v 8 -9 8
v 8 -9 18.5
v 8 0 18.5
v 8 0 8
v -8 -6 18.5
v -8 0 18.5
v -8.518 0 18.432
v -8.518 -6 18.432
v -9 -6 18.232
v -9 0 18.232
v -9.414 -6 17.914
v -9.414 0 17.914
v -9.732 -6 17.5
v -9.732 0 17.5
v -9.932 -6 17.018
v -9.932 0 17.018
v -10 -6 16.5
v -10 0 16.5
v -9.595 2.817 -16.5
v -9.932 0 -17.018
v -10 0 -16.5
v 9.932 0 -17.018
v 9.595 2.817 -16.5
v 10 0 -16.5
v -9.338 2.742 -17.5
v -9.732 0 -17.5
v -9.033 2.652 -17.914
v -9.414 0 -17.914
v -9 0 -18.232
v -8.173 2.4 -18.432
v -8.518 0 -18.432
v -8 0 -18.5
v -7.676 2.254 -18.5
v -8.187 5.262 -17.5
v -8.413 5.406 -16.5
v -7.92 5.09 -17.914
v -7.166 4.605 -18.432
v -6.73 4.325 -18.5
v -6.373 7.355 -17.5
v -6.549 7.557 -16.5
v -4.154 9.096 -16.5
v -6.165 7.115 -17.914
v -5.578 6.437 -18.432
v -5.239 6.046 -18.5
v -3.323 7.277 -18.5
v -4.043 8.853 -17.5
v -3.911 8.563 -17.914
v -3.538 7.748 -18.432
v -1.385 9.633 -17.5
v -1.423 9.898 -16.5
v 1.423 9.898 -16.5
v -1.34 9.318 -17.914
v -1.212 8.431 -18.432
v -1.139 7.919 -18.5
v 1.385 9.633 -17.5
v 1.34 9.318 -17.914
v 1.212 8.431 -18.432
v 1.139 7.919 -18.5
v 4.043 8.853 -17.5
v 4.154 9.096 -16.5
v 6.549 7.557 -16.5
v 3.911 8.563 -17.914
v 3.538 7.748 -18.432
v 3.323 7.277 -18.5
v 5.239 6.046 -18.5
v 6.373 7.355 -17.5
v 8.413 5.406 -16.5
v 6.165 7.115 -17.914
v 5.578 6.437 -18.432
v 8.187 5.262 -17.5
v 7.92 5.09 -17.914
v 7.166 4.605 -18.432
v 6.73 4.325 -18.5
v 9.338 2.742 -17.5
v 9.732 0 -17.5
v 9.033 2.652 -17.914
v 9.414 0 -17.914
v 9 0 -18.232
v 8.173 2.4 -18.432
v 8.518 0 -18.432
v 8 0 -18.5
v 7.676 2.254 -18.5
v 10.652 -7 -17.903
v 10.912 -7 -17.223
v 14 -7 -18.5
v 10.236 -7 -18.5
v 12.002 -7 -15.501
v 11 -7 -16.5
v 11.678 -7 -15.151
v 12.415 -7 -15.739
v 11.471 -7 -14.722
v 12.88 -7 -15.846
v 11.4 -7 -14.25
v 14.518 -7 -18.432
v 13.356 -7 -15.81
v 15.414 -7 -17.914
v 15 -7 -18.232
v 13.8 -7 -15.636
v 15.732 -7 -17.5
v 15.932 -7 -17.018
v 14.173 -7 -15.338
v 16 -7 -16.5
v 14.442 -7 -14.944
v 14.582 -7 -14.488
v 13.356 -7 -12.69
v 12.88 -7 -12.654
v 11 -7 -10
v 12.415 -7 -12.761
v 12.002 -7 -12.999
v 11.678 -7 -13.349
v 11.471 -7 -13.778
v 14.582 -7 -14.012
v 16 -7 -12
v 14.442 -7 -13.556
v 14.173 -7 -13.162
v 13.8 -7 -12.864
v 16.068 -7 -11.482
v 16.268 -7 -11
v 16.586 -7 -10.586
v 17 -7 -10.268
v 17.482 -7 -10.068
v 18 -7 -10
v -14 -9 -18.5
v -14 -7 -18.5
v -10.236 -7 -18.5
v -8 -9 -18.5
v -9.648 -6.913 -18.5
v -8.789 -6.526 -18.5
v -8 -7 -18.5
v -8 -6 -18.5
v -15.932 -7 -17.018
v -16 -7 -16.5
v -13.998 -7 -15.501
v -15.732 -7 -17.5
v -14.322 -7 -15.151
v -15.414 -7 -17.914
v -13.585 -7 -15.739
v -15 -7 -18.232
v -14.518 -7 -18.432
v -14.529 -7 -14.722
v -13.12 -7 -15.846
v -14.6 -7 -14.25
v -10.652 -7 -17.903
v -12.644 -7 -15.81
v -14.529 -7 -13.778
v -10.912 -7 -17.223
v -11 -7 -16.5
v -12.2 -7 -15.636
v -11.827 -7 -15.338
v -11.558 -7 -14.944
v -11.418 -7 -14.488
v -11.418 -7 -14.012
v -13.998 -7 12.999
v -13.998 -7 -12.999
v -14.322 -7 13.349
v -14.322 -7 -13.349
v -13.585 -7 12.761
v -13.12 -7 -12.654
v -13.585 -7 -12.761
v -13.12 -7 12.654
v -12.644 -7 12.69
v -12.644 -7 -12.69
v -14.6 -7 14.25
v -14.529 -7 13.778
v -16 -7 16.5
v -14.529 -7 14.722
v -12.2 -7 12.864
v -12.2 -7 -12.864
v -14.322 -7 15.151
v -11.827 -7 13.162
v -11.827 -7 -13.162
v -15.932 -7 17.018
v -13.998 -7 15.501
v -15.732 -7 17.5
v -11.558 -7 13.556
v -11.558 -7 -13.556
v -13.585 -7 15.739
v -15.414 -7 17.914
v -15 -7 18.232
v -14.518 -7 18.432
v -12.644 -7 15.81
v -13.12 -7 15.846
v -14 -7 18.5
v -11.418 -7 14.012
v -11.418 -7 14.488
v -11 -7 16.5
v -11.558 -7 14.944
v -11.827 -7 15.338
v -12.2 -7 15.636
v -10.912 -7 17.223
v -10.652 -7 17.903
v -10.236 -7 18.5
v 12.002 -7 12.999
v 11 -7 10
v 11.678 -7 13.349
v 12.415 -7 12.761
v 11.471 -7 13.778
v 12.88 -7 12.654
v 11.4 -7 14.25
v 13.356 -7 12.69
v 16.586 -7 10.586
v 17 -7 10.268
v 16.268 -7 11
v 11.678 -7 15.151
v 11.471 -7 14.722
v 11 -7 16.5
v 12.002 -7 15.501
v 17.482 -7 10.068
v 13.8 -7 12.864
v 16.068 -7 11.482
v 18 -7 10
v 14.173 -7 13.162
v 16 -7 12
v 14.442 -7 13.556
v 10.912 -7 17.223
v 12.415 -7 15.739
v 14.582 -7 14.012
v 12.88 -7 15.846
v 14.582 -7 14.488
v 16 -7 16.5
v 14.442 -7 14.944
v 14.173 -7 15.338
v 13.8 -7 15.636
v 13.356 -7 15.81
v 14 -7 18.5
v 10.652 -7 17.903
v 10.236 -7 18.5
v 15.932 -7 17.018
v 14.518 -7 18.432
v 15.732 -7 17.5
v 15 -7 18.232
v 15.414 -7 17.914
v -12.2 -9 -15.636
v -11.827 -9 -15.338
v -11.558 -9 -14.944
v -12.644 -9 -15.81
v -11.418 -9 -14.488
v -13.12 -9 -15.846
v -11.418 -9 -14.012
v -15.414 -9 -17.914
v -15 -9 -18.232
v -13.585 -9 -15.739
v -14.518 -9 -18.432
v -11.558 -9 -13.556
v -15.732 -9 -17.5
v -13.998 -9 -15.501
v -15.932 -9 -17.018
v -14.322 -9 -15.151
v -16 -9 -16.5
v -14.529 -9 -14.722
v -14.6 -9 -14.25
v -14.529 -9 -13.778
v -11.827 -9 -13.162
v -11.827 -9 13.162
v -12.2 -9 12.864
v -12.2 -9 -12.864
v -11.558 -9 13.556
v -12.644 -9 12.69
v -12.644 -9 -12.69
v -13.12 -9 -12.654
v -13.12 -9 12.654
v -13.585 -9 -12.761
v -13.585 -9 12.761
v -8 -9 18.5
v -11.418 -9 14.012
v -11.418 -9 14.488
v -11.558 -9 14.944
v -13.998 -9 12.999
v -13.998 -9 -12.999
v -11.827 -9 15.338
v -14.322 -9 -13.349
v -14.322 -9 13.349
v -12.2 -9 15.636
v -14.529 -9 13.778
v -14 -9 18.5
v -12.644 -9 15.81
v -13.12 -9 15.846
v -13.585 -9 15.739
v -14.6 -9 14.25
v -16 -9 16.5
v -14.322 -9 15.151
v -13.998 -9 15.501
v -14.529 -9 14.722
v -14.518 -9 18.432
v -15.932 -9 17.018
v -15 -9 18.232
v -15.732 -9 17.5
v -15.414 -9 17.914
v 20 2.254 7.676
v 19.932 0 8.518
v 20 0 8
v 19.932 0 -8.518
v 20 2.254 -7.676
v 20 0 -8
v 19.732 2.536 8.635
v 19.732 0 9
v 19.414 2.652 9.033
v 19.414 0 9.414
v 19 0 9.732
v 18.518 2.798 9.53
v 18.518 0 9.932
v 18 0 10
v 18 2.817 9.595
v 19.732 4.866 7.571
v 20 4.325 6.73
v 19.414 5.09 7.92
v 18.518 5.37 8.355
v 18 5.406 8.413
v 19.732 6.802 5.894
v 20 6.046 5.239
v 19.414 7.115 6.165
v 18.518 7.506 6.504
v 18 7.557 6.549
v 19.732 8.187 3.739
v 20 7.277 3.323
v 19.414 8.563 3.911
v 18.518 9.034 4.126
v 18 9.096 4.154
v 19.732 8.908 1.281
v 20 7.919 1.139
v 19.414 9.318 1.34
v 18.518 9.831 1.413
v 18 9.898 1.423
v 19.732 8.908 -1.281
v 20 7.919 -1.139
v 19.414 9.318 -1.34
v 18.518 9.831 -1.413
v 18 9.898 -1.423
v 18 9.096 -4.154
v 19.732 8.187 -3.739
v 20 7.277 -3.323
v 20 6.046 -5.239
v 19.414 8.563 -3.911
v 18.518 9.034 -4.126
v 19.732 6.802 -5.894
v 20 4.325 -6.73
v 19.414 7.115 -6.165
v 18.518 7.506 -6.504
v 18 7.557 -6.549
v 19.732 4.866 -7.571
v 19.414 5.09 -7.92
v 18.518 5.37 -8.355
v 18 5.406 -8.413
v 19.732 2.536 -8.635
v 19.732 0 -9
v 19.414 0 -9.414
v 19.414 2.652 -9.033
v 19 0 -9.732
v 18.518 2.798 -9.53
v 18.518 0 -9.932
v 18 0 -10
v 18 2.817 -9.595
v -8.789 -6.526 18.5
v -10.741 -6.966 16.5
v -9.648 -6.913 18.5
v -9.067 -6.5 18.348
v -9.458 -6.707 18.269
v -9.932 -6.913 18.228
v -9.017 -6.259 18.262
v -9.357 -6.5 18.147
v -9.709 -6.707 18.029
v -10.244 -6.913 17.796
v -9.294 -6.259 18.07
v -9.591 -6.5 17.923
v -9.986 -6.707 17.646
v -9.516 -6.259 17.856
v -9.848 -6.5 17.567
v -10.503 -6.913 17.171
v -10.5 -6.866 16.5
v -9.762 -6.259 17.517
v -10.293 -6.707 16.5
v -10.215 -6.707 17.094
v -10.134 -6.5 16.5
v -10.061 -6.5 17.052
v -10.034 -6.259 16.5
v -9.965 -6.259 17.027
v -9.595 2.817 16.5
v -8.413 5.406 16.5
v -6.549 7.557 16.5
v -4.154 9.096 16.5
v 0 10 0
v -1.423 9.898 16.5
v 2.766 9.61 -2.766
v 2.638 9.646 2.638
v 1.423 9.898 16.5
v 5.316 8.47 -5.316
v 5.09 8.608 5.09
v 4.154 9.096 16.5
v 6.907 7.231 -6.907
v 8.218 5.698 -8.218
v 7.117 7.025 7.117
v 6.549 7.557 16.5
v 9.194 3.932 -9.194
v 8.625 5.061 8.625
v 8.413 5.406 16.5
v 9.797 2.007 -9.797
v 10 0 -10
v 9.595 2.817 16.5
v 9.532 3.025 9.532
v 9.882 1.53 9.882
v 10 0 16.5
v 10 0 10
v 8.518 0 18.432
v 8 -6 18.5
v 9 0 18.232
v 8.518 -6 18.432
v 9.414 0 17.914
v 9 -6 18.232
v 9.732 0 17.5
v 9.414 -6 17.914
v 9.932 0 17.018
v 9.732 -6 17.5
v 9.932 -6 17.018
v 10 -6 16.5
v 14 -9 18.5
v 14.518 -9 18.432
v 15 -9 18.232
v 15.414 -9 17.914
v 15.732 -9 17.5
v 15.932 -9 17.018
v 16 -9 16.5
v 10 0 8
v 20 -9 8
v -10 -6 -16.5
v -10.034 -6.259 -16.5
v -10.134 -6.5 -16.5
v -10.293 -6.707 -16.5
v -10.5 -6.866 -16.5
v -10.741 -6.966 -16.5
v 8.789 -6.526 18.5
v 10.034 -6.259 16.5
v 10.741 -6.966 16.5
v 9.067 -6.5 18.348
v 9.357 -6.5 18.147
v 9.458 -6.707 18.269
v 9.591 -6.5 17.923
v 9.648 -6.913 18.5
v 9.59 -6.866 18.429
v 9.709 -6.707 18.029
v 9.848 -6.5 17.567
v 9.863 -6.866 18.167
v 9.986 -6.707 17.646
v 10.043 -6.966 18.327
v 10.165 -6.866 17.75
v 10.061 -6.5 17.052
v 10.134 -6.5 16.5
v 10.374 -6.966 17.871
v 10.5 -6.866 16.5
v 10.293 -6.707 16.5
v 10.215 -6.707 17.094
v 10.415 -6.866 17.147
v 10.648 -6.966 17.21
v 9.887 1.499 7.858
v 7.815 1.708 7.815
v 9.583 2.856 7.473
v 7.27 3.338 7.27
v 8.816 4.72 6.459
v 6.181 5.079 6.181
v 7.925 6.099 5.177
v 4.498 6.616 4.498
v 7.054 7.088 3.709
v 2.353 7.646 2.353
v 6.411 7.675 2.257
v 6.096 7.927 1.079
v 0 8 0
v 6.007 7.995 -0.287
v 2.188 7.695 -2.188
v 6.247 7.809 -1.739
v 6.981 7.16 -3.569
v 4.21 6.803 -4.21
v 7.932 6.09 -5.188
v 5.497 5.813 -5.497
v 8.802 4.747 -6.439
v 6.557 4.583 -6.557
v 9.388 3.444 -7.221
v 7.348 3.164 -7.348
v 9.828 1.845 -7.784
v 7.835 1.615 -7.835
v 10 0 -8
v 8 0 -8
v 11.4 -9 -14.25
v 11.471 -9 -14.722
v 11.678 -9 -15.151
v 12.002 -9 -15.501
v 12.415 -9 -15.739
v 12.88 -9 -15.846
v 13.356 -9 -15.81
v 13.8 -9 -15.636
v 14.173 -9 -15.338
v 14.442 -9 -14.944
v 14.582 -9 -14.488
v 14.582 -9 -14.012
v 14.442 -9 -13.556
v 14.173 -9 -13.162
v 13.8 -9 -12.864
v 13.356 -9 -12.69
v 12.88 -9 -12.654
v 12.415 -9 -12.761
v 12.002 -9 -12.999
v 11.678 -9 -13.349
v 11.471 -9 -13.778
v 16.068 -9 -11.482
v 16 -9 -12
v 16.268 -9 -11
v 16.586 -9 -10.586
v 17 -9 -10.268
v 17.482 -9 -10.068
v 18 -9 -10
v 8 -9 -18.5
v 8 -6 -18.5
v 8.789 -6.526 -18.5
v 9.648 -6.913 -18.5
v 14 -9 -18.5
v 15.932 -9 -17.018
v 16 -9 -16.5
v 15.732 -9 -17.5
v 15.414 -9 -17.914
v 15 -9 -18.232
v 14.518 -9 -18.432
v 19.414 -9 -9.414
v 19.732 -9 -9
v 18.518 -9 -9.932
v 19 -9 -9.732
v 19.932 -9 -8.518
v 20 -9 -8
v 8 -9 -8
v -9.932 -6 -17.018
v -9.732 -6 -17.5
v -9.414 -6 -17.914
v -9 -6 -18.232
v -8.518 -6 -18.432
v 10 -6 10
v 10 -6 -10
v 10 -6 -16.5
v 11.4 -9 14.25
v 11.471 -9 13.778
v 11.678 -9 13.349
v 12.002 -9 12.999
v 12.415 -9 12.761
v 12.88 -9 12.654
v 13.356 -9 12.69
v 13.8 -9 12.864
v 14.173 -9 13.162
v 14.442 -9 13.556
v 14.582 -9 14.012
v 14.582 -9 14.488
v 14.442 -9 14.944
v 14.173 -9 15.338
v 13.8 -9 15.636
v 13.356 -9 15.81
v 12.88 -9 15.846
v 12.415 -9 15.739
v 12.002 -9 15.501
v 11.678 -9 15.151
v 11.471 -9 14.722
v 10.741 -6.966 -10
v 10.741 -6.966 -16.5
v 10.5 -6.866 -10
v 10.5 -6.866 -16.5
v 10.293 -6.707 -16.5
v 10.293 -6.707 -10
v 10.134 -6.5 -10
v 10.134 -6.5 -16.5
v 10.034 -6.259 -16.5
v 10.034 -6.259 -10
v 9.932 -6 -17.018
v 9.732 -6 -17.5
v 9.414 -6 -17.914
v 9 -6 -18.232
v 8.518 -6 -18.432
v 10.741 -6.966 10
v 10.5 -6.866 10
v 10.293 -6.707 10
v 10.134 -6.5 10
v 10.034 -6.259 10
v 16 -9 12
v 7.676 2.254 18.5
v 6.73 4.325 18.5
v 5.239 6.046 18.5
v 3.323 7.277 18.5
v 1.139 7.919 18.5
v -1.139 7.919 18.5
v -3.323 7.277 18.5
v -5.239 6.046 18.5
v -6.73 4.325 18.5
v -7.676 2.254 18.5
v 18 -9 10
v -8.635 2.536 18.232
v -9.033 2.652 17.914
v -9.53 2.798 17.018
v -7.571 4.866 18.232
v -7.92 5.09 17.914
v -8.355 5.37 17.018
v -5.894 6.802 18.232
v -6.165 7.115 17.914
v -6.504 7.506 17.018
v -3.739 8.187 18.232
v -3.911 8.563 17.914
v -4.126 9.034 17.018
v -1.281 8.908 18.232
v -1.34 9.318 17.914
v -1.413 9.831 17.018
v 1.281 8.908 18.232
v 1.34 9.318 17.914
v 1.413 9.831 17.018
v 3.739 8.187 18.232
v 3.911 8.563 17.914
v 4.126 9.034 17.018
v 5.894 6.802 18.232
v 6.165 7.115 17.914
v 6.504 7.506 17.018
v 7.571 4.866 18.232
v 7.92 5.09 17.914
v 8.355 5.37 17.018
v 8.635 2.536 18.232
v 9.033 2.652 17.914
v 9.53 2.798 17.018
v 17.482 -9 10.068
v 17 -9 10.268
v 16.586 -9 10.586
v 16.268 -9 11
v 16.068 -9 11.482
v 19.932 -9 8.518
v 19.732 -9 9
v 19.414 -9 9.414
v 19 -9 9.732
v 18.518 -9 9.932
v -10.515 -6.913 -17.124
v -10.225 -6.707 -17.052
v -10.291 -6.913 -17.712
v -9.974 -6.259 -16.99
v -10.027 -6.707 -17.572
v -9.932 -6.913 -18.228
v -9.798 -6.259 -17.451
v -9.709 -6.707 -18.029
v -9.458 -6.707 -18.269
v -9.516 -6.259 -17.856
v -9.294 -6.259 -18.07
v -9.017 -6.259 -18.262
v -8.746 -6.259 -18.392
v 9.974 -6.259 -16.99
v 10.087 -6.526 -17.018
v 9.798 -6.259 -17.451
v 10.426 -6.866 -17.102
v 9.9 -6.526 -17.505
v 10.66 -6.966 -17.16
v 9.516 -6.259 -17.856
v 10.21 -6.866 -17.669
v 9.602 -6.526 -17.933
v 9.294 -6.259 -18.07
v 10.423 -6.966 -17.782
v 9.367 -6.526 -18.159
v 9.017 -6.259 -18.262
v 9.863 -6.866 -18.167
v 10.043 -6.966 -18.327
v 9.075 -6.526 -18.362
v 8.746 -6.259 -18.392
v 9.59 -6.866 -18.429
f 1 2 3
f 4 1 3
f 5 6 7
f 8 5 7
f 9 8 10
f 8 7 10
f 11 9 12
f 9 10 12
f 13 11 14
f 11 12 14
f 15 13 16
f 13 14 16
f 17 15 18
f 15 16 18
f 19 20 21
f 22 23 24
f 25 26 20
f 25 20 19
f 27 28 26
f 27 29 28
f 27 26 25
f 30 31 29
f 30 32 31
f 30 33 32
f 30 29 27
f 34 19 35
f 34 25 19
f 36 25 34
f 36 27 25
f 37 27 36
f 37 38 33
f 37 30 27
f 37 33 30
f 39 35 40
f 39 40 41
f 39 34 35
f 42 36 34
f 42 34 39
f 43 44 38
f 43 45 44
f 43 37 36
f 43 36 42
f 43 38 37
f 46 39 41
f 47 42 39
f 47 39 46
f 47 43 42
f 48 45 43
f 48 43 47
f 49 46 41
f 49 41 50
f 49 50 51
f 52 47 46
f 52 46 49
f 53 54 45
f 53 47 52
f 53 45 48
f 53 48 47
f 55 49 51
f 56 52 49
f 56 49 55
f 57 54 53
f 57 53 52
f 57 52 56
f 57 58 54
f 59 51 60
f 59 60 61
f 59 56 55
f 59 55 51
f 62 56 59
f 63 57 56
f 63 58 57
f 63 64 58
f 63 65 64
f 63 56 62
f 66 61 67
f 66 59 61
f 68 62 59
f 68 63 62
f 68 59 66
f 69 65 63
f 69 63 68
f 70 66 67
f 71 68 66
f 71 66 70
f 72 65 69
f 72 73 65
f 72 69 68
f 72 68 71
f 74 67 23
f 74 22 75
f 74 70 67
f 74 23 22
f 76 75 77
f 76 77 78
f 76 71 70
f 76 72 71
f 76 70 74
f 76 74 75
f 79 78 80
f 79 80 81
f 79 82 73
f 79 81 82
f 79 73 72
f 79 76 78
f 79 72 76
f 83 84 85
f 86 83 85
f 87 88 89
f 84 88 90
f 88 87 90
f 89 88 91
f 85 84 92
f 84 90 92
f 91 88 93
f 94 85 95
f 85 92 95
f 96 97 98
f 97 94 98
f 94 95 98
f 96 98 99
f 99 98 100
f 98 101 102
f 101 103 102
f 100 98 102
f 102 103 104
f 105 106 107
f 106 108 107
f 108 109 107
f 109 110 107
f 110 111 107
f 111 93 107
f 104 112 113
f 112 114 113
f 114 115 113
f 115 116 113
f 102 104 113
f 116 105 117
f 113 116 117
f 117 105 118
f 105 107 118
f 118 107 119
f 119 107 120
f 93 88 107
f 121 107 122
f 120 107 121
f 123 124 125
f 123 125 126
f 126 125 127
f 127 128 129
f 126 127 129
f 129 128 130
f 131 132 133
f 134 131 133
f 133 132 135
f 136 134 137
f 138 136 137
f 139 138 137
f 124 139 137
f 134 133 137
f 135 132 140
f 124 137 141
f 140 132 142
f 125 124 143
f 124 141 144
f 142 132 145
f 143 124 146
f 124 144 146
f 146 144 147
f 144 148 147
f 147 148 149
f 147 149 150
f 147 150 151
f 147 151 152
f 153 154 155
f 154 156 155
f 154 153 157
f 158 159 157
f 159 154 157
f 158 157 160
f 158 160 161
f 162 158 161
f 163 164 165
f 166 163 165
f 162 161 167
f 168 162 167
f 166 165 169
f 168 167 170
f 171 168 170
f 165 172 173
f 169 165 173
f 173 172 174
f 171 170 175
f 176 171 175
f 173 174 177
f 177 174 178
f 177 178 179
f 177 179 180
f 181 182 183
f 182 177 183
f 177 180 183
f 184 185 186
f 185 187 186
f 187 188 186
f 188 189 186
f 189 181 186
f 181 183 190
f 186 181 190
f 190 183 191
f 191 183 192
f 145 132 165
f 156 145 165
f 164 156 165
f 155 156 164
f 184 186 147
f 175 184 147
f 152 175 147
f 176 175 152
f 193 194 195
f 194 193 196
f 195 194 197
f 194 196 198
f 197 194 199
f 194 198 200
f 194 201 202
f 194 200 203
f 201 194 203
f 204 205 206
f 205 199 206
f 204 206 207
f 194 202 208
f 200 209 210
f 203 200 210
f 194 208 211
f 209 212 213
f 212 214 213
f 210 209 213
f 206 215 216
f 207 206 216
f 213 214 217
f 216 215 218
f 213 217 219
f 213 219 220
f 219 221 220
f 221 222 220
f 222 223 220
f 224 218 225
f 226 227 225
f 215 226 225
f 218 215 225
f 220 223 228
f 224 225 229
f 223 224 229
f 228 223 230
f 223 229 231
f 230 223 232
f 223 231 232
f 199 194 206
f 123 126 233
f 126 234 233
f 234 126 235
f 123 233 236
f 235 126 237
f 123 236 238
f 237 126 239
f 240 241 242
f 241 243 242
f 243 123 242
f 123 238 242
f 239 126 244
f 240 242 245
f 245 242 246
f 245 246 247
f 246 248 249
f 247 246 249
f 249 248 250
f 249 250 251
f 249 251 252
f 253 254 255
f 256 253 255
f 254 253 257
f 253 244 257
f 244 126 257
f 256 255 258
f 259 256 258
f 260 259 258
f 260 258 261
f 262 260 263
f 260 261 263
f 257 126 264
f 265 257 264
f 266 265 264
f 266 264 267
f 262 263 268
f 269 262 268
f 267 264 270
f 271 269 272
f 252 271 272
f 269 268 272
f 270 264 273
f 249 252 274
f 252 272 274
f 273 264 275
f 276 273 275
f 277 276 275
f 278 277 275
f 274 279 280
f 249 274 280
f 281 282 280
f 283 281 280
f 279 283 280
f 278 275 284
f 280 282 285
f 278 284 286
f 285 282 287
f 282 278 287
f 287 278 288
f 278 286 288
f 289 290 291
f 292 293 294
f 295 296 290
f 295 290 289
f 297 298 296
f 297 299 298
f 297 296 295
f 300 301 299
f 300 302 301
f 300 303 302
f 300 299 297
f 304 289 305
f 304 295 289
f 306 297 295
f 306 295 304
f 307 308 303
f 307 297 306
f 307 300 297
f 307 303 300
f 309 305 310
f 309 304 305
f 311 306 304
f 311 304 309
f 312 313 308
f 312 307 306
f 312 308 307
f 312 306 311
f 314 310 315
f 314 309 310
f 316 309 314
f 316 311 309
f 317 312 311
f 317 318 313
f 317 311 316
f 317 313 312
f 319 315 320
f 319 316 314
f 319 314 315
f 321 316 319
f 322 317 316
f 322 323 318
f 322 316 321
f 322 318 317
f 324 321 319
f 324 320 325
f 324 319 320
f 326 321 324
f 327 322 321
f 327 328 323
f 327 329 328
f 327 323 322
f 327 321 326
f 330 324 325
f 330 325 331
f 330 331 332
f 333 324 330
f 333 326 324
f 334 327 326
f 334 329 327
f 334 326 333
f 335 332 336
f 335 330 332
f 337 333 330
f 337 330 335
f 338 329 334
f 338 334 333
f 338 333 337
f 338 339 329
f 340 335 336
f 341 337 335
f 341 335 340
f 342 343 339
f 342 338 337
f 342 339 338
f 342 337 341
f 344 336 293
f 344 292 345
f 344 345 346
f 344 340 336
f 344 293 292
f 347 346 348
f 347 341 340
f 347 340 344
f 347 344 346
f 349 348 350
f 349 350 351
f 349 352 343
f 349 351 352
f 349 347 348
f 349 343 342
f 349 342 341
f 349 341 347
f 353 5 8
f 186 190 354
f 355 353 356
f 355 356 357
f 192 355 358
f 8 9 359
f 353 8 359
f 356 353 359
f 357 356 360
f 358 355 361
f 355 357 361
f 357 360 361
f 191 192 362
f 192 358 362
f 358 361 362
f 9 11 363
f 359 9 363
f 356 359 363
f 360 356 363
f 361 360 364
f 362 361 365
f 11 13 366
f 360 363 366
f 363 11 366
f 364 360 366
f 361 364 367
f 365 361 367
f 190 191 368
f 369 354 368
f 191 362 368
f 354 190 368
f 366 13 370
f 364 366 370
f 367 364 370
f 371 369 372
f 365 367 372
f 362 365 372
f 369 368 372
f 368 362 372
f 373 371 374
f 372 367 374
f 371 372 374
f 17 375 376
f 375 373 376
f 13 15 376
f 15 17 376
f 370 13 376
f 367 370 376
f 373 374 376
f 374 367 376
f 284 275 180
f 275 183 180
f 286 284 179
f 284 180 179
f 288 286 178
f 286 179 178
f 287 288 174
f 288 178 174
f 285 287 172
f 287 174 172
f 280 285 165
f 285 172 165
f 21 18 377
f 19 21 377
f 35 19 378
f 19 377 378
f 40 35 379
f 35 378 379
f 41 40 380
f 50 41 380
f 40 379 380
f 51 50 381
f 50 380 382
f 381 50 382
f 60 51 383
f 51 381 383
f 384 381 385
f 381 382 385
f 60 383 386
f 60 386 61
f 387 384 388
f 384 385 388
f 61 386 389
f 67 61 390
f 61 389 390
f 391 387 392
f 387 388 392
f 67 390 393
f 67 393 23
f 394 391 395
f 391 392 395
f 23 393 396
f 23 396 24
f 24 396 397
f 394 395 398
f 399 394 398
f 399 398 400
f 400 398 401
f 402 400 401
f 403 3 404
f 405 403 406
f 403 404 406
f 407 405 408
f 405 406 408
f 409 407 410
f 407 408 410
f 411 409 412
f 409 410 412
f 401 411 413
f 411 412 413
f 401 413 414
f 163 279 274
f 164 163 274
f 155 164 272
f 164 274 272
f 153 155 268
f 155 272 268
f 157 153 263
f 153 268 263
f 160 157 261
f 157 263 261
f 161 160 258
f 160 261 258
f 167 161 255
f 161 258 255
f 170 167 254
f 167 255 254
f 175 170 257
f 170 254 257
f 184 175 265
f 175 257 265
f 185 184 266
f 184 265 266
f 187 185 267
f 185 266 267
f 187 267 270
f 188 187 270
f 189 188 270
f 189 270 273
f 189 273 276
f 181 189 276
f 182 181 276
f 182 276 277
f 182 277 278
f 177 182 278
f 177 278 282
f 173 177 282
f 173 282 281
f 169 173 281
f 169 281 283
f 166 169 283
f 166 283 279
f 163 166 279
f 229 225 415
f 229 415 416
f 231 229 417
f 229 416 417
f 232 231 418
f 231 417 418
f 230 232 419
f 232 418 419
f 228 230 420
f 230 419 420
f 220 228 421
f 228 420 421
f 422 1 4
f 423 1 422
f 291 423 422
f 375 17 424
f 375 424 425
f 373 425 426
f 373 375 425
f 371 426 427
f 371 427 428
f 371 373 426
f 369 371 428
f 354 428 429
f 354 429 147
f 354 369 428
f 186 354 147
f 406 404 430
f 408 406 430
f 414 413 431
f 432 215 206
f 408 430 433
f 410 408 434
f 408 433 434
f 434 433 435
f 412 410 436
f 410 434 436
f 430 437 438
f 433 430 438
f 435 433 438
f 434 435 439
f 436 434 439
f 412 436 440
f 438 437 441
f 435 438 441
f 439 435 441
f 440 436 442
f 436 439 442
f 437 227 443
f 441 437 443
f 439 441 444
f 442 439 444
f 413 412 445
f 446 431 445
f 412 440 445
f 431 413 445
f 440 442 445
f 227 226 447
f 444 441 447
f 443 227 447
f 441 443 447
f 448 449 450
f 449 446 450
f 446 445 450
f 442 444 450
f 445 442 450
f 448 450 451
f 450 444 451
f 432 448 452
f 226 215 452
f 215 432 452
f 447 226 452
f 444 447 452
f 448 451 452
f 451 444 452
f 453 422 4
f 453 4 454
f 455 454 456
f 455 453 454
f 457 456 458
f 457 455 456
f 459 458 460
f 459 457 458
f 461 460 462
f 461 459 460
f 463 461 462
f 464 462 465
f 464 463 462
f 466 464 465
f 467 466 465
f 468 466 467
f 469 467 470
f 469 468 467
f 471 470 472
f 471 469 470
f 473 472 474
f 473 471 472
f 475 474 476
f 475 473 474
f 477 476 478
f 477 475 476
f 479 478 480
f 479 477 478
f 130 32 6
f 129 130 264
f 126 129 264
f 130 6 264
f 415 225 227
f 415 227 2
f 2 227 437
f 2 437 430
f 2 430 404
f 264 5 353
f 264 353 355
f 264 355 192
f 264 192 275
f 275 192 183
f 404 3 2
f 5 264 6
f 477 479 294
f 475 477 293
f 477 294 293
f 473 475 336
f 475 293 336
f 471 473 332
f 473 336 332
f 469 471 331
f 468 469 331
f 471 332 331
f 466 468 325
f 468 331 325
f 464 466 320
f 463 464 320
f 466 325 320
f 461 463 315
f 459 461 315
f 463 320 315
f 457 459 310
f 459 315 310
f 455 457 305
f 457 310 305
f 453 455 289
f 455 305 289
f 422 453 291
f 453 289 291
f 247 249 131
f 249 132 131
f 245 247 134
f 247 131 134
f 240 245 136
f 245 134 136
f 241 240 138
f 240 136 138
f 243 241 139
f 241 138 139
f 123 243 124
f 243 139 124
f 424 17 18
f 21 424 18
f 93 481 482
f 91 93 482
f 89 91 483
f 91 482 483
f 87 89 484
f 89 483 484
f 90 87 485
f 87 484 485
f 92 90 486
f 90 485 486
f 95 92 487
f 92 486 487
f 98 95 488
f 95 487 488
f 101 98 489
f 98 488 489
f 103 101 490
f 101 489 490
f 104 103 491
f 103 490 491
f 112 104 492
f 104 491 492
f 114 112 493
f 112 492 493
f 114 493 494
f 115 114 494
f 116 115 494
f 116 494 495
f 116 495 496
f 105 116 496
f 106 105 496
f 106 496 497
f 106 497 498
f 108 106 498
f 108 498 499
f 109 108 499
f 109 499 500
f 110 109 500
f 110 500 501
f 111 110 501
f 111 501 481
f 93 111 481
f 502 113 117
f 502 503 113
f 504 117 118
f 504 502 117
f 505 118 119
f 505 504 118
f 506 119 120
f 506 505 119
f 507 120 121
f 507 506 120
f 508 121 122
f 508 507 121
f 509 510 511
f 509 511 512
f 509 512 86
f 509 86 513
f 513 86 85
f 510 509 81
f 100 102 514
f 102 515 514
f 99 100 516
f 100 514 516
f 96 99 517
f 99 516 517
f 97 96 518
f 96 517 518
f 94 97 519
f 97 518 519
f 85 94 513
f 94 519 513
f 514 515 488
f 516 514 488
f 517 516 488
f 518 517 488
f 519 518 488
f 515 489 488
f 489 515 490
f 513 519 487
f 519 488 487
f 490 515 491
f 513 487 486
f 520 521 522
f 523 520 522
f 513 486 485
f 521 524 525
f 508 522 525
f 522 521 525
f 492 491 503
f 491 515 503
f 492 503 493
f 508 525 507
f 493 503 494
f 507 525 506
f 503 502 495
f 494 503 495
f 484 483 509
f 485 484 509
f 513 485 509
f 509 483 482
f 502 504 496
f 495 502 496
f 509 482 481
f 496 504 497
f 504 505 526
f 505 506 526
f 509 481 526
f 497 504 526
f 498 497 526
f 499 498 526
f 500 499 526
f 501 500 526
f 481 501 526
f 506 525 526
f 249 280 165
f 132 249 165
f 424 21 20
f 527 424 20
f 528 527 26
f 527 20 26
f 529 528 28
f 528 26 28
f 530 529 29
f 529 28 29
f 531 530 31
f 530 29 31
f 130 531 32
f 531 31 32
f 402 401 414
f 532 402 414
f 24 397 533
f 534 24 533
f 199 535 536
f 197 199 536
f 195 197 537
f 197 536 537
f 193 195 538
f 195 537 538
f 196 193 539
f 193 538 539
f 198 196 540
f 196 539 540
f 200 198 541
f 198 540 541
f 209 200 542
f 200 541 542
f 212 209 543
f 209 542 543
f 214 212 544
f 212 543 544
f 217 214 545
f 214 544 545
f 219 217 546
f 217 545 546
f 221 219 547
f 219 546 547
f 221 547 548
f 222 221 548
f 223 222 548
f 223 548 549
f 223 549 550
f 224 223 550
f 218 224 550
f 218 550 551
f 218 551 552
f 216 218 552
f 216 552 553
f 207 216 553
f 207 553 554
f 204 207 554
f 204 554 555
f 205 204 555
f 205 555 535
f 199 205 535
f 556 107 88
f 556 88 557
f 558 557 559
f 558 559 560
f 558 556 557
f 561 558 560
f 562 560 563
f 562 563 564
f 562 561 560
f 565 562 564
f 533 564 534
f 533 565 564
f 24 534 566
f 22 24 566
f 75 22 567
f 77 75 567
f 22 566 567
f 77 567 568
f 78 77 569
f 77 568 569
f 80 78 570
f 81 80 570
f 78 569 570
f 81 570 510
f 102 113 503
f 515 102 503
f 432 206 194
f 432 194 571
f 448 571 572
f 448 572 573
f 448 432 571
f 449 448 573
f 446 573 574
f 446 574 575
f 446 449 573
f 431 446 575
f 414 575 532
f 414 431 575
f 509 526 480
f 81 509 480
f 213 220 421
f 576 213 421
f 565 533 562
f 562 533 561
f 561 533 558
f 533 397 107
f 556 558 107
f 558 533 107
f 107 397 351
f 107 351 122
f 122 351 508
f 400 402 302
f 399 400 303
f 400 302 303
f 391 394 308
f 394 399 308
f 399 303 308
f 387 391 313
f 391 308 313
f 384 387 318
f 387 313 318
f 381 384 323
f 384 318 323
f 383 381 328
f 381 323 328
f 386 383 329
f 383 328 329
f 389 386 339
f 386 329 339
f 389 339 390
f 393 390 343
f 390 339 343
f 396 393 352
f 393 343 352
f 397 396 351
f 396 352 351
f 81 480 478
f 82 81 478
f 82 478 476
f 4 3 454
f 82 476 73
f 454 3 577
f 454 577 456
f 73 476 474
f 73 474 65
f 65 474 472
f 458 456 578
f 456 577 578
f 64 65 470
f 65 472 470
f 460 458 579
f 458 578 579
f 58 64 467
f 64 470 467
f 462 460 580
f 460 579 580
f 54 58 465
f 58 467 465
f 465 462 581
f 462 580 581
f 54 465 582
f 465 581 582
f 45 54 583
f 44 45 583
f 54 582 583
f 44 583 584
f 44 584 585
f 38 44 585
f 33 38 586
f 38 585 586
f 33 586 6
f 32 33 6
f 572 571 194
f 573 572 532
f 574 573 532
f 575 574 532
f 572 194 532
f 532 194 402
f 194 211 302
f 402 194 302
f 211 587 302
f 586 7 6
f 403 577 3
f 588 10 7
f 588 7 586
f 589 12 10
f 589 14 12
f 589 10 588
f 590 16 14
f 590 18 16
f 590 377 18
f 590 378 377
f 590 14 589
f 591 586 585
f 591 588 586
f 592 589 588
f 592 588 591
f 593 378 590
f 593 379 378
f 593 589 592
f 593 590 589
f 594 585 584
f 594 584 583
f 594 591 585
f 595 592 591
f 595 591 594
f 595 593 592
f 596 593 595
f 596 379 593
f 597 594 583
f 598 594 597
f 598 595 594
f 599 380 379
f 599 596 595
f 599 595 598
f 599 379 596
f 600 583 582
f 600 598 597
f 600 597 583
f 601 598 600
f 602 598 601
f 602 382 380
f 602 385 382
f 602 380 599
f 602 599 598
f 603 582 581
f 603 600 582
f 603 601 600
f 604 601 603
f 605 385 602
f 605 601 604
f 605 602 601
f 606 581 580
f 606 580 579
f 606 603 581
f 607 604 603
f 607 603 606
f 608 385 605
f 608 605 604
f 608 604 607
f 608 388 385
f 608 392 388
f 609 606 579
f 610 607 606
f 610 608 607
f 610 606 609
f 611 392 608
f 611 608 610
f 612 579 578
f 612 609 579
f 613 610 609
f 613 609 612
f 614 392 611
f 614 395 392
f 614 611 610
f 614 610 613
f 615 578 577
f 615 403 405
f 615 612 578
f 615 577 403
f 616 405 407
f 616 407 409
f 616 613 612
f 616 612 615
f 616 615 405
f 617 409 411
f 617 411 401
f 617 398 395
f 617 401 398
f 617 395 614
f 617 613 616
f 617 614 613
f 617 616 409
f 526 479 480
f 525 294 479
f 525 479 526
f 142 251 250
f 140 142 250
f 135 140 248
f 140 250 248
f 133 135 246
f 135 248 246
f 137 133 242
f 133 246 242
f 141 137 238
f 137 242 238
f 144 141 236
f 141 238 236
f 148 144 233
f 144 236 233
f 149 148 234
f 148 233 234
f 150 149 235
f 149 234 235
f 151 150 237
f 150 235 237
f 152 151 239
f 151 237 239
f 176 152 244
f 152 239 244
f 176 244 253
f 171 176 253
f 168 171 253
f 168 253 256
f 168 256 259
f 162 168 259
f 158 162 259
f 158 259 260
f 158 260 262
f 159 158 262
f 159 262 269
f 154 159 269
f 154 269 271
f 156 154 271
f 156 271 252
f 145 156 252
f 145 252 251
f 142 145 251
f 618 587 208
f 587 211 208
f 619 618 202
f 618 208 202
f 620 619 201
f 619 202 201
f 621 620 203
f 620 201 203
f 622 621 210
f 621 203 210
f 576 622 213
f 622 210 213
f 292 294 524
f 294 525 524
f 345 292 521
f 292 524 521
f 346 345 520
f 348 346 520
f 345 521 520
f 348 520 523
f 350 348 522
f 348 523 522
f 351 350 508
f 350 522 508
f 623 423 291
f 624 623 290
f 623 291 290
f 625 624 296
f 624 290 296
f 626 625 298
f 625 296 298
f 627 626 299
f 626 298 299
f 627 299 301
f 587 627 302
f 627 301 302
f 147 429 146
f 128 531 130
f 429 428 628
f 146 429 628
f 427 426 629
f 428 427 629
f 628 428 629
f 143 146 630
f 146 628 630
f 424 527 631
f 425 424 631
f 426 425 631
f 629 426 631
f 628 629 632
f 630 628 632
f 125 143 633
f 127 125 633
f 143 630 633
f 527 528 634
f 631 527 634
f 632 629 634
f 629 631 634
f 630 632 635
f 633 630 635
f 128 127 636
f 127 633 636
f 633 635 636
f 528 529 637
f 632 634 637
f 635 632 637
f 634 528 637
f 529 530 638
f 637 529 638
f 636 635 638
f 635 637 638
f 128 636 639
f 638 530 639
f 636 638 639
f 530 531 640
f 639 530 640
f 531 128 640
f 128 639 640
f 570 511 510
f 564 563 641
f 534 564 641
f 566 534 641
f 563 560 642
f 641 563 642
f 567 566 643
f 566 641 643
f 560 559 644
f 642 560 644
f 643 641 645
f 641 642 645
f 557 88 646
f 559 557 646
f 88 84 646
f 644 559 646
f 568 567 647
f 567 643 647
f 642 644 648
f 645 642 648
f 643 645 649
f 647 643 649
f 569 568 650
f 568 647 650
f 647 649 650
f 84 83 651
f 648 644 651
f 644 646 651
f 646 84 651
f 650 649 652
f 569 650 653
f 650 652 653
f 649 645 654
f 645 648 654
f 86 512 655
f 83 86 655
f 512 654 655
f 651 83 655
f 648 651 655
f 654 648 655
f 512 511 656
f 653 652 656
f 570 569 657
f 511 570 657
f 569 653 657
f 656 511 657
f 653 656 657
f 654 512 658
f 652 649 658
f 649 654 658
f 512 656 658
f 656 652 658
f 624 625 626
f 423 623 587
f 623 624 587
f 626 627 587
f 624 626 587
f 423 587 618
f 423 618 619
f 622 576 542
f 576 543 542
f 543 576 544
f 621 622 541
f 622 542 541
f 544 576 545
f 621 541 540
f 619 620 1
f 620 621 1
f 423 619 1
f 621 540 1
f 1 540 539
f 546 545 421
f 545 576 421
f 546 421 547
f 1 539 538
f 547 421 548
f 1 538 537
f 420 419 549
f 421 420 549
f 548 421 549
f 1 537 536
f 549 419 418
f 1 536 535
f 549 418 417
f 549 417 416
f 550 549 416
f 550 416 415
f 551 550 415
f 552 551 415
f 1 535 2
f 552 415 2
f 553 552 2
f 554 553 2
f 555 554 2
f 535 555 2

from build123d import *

# Parameters (mm, degrees)
BOSS_EXTRUDE2_DEPTH  = 18.5
M3_CLEARANCE_HOLE1_D = 3.2
BOSS_EXTRUDE3_REACH  = 43.692
CUT_EXTRUDE1_REACH   = 43.692
FILLET1_R            = 2
FILLET2_R            = 1


# Some blends are built 0.0001 mm under size
with BuildPart() as part:
    # Sketch2 → Boss-Extrude2 (new, symmetric)
    with BuildSketch(Plane.XY):
        with BuildLine():
            Line((-8, 0), (-8, -9))
            Line((-8, -9), (-16, -9))
            Line((-16, -9), (-16, -7))
            Line((-16, -7), (-10, -7))
            Line((-10, -7), (-10, 0))
            ThreePointArc((-10, 0), (0, 10), (10, 0))
            Line((10, 0), (10, -7))
            Line((10, -7), (16, -7))
            Line((16, -7), (16, -9))
            Line((16, -9), (8, -9))
            Line((8, -9), (8, 0))
            ThreePointArc((8, 0), (0, 8), (-8, 0))
        make_face()
    extrude(amount=BOSS_EXTRUDE2_DEPTH, both=True)

    # M3 Clearance Hole1 (through all)
    with Locations(Plane(origin=(0, -7, 0), x_dir=(1, 0, 0), z_dir=(0, 1, 0))):
        with Locations((-13, 14.25), (13, 14.25), (13, -14.25), (-13, -14.25)):
            Hole(M3_CLEARANCE_HOLE1_D / 2)

    # Sketch6 → Boss-Extrude3 (add, up to next)
    with BuildSketch(Plane(origin=(20, 0, 0), x_dir=(0, 0, -1), z_dir=(1, 0, 0)), mode=Mode.PRIVATE) as boss_extrude3_sk1:
        with BuildLine():
            Line((-8, 0), (-8, -9))
            Line((-8, -9), (-10, -9))
            Line((-10, -9), (-10, 0))
            ThreePointArc((-10, 0), (0, 10), (10, 0))
            Line((10, 0), (10, -9))
            Line((10, -9), (8, -9))
            Line((8, -9), (8, 0))
            ThreePointArc((8, 0), (0, 8), (-8, 0))
        make_face()
    boss_extrude3_tool1 = extrude(boss_extrude3_sk1.sketch, amount=-BOSS_EXTRUDE3_REACH, mode=Mode.PRIVATE) - part.part
    add(boss_extrude3_tool1.solids().sort_by_distance((20, -4.5, -9.724138))[0])

    # Sketch7 → Cut-Extrude1 (cut, up to next)
    with BuildSketch(Plane(origin=(20, 0, 0), x_dir=(0, 0, -1), z_dir=(1, 0, 0)), mode=Mode.PRIVATE) as cut_extrude1_sk1:
        with BuildLine():
            Line((8, 0), (8, -7))
            Line((8, -7), (8, -9))
            Line((8, -9), (-8, -9))
            Line((-8, -9), (-8, -7))
            Line((-8, -7), (-8, 0))
            ThreePointArc((-8, 0), (0, 8), (8, 0))
        make_face()
    cut_extrude1_tool1 = extrude(cut_extrude1_sk1.sketch, amount=-CUT_EXTRUDE1_REACH, mode=Mode.PRIVATE) & part.part
    add(cut_extrude1_tool1.solids().sort_by_distance((20, -1.254102, 0))[0], mode=Mode.SUBTRACT)

    # Fillet1
    fillet1_edges = [part.edges().sort_by_distance(p)[0] for p in [
        (16, -8, -10),
        (16, -8, 10),
        (16, -8, 18.5),
        (16, -8, -18.5),
        (-16, -8, 18.5),
        (-16, -8, -18.5),
        (20, -4.5, 10),
        (20, 10, 0),
        (20, -4.5, -10),
        (10, -3.5, -18.5),
        (-10, -3.5, -18.5),
        (10, -3.5, 18.5),
        (-10, -3.5, 18.5),
        (0, 10, -18.5),
        (0, 10, 18.5),
    ]]
    fillet(fillet1_edges, radius=FILLET1_R - 0.0001)  # a hair under: the kernel refuses the full size

    # Fillet2
    # the kernel refuses this fillet: 1 mm, written as the material it adds along each edge
    with BuildSketch(Plane(origin=(-10, -7, 16.5001), x_dir=(0, 1, 0), z_dir=(0, 0, -1))) as fillet2_piece_1:
        with BuildLine():
            CenterArc((FILLET2_R, -FILLET2_R), FILLET2_R, 90, 90)
            Line((0, -FILLET2_R), (0, 0))
            Line((0, 0), (FILLET2_R, 0))
        make_face()
    extrude(amount=33.0002)
    with BuildSketch(Plane(origin=(10, -7, 16.5001), x_dir=(0, 1, 0), z_dir=(0, 0, -1)), Plane(origin=(10, -7, -10), x_dir=(0, 1, 0), z_dir=(0, 0, -1))) as fillet2_piece_2:
        with BuildLine():
            CenterArc((FILLET2_R, FILLET2_R), FILLET2_R, 180, 90)
            Line((0, FILLET2_R), (0, 0))
            Line((0, 0), (FILLET2_R, 0))
        make_face()
    extrude(amount=6.5001)
    with BuildSketch(Plane(origin=(8.0001, -7, -16.5001), x_dir=(1, 0, 0), z_dir=(0, 0, 1))) as fillet2_piece_3_section:
        with BuildLine():
            CenterArc((1.9999 + FILLET2_R, FILLET2_R), FILLET2_R, 180, 90)
            Line((1.9999, FILLET2_R), (1.9999, 0))
            Line((1.9999, 0), (1.9999 + FILLET2_R, 0))
        make_face()
    fillet2_piece_3 = revolve(axis=Axis((8.0001, -7, -16.5001), (0, 1, 0)), revolution_arc=161.652077223, mode=Mode.PRIVATE)
    fillet2_piece_3 = split(fillet2_piece_3, bisect_by=Plane(origin=(10.2121031, -6.837361474, -18.5), z_dir=(0, 0, 1)), keep=Keep.TOP, mode=Mode.PRIVATE)
    fillet2_piece_3 = split(fillet2_piece_3, bisect_by=Plane(origin=(8, -6.837361474, -17.073760291), z_dir=(1, 0, 0)), keep=Keep.TOP, mode=Mode.PRIVATE)
    add(fillet2_piece_3)
    with BuildSketch(Plane(origin=(-8.0001, -7, -16.5001), x_dir=(-1, 0, 0), z_dir=(0, 0, 1))) as fillet2_piece_4_section:
        with BuildLine():
            CenterArc((1.9999 + FILLET2_R, -FILLET2_R), FILLET2_R, 90, 90)
            Line((1.9999 + FILLET2_R, 0), (1.9999, 0))
            Line((1.9999, 0), (1.9999, -FILLET2_R))
        make_face()
    fillet2_piece_4 = revolve(axis=Axis((-8.0001, -7, -16.5001), (0, -1, 0)), revolution_arc=161.652077223, mode=Mode.PRIVATE)
    fillet2_piece_4 = split(fillet2_piece_4, bisect_by=Plane(origin=(-8, -6.727847021, -17.962226861), z_dir=(-1, 0, 0)), keep=Keep.TOP, mode=Mode.PRIVATE)
    fillet2_piece_4 = split(fillet2_piece_4, bisect_by=Plane(origin=(-9.462226887, -6.727847021, -18.5), z_dir=(0, 0, 1)), keep=Keep.TOP, mode=Mode.PRIVATE)
    add(fillet2_piece_4)
    with BuildSketch(Plane(origin=(8.0001, -7, 16.5001), x_dir=(-0.949162519062451, 0, 0.3147864552470806), z_dir=(-0.3147864552470806, 0, -0.949162519062451))) as fillet2_piece_5_section:
        with BuildLine():
            CenterArc((1.9999 + FILLET2_R, FILLET2_R), FILLET2_R, 180, 90)
            Line((1.9999, FILLET2_R), (1.9999, 0))
            Line((1.9999, 0), (1.9999 + FILLET2_R, 0))
        make_face()
    fillet2_piece_5 = revolve(axis=Axis((8.0001, -7, 16.5001), (0, 1, 0)), revolution_arc=161.652077223, mode=Mode.PRIVATE)
    fillet2_piece_5 = split(fillet2_piece_5, bisect_by=Plane(origin=(9.462226477, -6.727846247, 18.5), z_dir=(0, 0, -1)), keep=Keep.TOP, mode=Mode.PRIVATE)
    fillet2_piece_5 = split(fillet2_piece_5, bisect_by=Plane(origin=(8, -6.727846247, 17.962227025), z_dir=(1, 0, 0)), keep=Keep.TOP, mode=Mode.PRIVATE)
    add(fillet2_piece_5)
    with BuildSketch(Plane(origin=(-8.0001, -7, 16.5001), x_dir=(0.949162519062451, 0, 0.3147864552470806), z_dir=(0.3147864552470806, 0, -0.949162519062451))) as fillet2_piece_6_section:
        with BuildLine():
            CenterArc((1.9999 + FILLET2_R, -FILLET2_R), FILLET2_R, 90, 90)
            Line((1.9999 + FILLET2_R, 0), (1.9999, 0))
            Line((1.9999, 0), (1.9999, -FILLET2_R))
        make_face()
    fillet2_piece_6 = revolve(axis=Axis((-8.0001, -7, 16.5001), (0, -1, 0)), revolution_arc=161.652077223, mode=Mode.PRIVATE)
    fillet2_piece_6 = split(fillet2_piece_6, bisect_by=Plane(origin=(-9.462226765, -6.727846718, 18.5), z_dir=(0, 0, -1)), keep=Keep.TOP, mode=Mode.PRIVATE)
    fillet2_piece_6 = split(fillet2_piece_6, bisect_by=Plane(origin=(-8, -6.727846718, 17.962226739), z_dir=(-1, 0, 0)), keep=Keep.TOP, mode=Mode.PRIVATE)
    add(fillet2_piece_6)


solid = part.part
